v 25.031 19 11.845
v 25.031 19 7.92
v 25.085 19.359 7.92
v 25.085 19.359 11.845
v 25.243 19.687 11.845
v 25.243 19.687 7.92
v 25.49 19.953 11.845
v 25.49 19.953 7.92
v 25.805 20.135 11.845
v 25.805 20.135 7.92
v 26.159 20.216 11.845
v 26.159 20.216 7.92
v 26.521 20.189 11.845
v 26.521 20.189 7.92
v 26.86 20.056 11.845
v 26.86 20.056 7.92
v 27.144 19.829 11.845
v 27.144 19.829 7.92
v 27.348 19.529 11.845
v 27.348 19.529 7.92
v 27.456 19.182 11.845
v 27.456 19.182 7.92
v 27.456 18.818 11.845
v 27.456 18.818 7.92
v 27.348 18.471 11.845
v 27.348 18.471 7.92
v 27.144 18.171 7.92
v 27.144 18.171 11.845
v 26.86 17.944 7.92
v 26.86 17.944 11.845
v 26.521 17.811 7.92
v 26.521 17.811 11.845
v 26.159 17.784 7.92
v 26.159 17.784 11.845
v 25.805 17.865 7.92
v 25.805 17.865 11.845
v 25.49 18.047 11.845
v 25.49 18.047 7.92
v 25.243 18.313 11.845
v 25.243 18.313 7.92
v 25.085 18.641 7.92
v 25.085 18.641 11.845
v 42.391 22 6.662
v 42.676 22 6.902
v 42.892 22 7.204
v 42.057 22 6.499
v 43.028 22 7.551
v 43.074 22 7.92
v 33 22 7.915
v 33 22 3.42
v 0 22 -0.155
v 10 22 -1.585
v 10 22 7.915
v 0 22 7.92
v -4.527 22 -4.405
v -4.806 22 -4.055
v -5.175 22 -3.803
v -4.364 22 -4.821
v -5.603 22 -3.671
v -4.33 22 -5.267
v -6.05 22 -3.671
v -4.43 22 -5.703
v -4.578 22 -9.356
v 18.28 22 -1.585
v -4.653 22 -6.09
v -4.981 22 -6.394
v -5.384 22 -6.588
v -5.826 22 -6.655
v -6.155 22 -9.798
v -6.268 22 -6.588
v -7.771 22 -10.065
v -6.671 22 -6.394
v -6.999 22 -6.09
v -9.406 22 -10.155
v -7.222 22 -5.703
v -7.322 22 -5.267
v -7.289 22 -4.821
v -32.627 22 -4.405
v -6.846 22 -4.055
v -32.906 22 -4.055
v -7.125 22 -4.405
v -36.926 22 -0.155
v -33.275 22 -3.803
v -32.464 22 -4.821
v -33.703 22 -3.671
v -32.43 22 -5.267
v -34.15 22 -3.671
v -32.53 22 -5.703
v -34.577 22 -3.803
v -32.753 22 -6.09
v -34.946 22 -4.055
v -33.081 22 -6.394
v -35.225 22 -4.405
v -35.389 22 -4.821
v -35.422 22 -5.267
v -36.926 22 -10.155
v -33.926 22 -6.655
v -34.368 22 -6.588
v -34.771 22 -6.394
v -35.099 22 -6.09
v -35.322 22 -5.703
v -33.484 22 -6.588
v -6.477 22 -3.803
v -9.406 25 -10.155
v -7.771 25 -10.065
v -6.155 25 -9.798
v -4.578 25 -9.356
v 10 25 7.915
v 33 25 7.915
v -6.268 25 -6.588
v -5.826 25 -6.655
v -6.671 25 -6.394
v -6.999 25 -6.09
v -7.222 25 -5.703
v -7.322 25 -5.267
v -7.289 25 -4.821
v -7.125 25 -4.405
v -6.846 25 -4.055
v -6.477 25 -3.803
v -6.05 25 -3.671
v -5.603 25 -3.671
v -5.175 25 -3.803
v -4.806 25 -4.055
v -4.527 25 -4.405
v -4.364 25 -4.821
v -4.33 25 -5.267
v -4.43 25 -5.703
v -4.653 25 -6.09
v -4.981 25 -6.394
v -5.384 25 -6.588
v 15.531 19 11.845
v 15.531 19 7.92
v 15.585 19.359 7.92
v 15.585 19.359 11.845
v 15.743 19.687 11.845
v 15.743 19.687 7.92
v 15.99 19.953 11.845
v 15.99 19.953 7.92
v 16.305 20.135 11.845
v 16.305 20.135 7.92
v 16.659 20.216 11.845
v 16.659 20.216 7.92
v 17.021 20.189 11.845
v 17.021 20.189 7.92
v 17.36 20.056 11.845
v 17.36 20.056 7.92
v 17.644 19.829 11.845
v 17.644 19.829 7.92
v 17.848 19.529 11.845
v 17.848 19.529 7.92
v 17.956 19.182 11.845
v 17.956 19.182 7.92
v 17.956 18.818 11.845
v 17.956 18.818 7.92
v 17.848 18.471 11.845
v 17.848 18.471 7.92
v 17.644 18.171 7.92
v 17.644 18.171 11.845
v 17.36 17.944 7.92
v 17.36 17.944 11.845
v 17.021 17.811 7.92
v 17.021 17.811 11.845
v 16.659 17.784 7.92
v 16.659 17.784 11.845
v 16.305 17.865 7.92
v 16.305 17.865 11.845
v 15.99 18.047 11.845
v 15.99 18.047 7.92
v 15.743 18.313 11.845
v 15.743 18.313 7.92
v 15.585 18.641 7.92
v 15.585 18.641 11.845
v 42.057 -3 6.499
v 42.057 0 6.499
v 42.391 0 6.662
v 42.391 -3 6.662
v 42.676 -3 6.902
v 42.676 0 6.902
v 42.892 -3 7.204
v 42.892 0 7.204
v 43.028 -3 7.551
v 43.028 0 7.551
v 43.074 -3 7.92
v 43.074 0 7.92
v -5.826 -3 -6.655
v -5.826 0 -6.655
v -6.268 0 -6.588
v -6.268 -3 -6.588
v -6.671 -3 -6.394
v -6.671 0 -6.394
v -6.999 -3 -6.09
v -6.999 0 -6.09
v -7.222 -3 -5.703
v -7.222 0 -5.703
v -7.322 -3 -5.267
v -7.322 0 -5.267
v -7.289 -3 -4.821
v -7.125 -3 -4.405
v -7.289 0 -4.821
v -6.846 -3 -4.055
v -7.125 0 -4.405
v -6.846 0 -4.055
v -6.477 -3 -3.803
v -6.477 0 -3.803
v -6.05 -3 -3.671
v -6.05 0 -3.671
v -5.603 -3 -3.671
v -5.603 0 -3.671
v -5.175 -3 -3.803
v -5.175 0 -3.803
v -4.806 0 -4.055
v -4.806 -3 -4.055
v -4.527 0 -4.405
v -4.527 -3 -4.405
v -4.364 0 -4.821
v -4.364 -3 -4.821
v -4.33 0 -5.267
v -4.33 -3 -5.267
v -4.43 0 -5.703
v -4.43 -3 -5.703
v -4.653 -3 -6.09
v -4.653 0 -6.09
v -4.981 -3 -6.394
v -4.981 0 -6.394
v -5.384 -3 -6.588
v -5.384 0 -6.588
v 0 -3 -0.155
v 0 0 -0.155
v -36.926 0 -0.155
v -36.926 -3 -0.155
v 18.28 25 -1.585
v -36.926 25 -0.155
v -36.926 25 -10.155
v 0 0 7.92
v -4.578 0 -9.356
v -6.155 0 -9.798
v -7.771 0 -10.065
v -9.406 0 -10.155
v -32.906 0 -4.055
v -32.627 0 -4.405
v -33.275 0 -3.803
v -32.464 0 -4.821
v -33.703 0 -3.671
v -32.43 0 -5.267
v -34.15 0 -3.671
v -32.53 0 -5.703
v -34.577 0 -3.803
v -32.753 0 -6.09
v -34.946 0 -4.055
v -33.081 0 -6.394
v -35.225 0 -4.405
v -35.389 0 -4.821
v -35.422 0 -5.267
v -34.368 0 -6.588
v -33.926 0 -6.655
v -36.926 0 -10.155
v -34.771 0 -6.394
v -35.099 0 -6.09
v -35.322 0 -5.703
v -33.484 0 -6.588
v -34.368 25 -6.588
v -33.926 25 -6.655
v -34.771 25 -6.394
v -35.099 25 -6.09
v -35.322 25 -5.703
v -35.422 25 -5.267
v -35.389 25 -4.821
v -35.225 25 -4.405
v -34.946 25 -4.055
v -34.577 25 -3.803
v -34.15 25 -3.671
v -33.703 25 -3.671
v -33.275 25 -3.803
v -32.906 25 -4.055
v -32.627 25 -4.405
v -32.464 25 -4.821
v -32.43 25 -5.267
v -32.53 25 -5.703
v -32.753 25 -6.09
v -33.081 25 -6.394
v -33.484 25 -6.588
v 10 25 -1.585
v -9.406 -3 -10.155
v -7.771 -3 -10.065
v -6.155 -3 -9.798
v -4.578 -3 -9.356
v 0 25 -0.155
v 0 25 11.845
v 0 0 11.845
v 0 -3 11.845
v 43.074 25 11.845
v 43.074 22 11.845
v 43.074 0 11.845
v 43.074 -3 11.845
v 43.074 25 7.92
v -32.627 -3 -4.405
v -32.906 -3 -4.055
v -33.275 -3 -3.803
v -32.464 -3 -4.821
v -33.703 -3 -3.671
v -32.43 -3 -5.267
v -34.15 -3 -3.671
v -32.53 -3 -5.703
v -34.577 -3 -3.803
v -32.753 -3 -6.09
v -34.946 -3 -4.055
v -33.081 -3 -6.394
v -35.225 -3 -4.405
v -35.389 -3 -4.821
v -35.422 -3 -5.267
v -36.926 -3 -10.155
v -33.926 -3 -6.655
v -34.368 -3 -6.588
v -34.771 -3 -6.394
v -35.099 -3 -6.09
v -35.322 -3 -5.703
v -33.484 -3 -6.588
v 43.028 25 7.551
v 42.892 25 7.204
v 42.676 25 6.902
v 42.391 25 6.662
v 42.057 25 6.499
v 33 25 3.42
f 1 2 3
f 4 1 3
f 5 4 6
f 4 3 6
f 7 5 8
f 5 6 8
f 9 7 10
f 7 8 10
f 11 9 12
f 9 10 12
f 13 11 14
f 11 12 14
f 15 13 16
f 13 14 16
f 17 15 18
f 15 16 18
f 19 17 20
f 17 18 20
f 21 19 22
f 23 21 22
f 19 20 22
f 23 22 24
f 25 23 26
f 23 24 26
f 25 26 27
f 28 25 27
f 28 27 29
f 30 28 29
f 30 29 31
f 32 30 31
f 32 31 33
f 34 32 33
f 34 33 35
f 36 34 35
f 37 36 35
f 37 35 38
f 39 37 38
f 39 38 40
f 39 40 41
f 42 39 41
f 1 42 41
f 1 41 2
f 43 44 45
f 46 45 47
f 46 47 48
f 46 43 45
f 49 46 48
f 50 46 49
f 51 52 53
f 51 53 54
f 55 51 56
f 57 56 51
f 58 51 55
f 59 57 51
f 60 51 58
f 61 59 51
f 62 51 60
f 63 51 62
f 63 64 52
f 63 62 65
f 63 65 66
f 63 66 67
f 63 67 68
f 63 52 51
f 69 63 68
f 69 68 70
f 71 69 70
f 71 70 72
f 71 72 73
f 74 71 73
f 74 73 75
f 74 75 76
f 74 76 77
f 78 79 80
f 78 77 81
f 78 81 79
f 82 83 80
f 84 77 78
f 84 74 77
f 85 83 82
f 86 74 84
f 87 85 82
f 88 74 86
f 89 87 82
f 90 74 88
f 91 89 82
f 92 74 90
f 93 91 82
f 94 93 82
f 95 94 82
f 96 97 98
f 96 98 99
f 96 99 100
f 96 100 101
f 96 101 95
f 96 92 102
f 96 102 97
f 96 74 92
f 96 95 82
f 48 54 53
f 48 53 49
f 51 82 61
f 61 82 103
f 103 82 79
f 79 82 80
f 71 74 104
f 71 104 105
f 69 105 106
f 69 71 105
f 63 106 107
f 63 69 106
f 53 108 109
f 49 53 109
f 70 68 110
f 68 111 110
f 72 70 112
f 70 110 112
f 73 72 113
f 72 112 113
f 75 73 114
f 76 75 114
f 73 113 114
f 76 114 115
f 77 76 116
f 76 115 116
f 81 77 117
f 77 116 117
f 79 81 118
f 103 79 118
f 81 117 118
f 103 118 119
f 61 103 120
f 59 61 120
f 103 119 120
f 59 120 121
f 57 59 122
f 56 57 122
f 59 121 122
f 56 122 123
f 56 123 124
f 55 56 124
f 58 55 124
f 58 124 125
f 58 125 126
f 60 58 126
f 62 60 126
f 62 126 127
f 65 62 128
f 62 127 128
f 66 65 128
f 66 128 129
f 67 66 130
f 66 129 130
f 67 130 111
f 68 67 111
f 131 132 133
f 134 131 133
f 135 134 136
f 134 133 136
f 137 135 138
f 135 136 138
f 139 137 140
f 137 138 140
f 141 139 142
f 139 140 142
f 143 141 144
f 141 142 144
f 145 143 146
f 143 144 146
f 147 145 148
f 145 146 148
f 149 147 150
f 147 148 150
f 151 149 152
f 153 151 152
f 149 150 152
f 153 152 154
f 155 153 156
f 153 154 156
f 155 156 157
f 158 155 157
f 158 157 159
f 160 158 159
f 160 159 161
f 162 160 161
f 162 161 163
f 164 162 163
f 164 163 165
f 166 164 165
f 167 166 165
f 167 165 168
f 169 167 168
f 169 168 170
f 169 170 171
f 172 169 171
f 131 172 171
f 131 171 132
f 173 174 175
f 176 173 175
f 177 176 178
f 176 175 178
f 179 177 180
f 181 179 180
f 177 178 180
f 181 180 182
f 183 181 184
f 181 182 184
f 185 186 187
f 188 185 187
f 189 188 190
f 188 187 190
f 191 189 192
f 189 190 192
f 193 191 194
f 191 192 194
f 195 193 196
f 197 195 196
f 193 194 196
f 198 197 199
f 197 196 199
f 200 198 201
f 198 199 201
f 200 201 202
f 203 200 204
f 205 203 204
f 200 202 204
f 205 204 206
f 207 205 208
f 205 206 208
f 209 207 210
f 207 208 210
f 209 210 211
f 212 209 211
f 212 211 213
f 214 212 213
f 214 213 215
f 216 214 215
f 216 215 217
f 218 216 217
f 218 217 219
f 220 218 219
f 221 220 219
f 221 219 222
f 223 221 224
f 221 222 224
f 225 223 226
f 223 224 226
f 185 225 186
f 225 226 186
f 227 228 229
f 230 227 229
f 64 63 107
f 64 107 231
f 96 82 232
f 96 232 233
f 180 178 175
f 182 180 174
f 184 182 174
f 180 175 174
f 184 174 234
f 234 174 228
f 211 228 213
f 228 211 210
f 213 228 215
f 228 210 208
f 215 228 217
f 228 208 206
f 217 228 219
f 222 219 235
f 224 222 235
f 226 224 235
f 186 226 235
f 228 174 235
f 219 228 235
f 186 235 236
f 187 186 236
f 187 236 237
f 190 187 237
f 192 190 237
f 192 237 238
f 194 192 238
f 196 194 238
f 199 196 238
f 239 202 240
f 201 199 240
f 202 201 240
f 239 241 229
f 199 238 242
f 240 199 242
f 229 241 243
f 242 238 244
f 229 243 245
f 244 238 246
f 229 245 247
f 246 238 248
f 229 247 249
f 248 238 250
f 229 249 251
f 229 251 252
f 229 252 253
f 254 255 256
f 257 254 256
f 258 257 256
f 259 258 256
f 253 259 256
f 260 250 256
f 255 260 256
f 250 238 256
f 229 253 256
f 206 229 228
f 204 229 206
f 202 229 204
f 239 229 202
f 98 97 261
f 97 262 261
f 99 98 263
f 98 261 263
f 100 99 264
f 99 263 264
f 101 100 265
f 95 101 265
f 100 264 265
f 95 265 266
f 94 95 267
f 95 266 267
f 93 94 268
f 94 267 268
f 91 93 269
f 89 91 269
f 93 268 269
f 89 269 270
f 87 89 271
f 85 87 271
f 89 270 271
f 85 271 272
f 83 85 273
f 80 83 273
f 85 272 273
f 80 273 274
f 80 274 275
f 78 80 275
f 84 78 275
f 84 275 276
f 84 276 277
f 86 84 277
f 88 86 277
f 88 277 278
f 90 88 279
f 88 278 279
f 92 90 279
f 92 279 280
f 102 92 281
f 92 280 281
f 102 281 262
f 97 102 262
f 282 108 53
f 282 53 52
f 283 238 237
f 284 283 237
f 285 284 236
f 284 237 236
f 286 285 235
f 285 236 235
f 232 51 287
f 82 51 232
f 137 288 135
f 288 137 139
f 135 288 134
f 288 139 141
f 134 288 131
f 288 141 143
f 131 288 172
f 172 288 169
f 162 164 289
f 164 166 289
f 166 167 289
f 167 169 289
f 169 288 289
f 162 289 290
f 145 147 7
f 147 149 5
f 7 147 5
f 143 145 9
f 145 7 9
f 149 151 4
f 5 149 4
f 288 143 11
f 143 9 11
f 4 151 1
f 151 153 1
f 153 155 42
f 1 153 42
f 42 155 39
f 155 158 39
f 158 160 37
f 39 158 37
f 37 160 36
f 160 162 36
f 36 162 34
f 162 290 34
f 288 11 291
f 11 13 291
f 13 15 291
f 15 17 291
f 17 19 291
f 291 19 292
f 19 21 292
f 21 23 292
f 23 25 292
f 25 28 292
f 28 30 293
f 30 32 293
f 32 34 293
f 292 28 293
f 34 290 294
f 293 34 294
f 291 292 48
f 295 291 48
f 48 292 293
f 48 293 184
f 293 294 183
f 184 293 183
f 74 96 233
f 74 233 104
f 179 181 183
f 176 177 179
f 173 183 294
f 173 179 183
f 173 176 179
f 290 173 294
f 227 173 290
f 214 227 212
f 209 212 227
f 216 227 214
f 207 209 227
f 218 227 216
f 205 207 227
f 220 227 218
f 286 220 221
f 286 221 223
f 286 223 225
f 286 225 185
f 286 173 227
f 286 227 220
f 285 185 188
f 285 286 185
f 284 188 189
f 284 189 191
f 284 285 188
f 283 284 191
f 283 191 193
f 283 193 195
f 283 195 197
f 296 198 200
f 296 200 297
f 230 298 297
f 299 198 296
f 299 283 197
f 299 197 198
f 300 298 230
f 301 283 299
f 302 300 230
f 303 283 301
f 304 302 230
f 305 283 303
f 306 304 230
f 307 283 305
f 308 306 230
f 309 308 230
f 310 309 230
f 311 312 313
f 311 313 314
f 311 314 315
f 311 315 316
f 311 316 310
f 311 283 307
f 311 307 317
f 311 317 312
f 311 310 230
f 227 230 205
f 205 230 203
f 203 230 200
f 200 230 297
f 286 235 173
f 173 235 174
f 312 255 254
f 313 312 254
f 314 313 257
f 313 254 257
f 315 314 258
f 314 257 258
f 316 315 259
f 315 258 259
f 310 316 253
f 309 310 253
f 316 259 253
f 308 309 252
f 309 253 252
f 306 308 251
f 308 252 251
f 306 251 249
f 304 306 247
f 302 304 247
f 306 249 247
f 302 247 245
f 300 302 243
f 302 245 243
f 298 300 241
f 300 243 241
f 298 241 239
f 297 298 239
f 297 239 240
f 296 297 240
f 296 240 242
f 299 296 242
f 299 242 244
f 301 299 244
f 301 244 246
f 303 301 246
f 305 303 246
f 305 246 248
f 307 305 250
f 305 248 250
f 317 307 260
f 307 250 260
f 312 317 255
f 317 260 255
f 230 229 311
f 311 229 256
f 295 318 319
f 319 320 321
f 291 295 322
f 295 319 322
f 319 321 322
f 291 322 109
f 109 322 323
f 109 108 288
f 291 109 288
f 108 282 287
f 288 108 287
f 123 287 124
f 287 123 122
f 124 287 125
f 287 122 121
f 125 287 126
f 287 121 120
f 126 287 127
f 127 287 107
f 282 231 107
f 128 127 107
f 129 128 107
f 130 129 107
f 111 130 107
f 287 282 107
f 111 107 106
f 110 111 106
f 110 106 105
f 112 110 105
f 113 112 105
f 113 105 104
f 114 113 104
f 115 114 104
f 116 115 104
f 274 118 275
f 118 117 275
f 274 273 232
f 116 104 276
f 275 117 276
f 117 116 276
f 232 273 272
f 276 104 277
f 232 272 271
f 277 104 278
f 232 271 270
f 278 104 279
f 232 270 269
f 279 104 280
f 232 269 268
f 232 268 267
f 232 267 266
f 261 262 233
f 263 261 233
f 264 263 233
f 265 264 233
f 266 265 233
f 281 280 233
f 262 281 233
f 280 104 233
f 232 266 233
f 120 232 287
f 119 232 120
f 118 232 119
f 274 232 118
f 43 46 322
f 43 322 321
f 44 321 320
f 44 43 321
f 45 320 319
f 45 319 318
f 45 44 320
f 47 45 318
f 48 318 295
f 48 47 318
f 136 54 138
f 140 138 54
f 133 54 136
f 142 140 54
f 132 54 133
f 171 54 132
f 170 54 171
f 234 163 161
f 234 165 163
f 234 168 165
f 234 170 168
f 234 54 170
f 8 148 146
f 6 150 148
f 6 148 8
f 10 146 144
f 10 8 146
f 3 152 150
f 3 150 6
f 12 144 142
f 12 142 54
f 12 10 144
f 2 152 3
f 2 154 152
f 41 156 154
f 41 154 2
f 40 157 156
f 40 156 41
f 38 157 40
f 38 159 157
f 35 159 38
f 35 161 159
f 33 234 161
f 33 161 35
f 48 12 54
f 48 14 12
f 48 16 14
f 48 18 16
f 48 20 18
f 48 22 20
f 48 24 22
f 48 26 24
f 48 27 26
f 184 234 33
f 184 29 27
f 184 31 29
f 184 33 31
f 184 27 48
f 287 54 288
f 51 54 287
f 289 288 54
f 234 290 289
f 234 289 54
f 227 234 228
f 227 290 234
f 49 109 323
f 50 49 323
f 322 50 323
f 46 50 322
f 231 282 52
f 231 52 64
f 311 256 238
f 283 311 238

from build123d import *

# Parameters (mm, degrees)
BOSS_EXTRUDE1_DEPTH                      = 3
BOSS_EXTRUDE2_START                      = 22
BOSS_EXTRUDE2_DEPTH                      = 3
SKETCH3_W                                = 1.5
SKETCH3_H                                = 28
F_3_0MM_CLEARANCE_DOWEL_HOLE1_AT_2_COUNT = 2
F_3_0MM_CLEARANCE_DOWEL_HOLE1_AT_2_PITCH = 28.1
SKETCH5_W                                = 43.073811931
SKETCH5_H                                = 3.925670489
BOSS_EXTRUDE3_DEPTH                      = 22
SKETCH6_W                                = 23
SKETCH6_H                                = 9.5
CUT_EXTRUDE1_DEPTH                       = 10
F_2_CLEARANCE_HOLE1_D                    = 2.4384


with BuildPart() as part:
    # Sketch1 → Boss-Extrude1 (new body)
    with BuildSketch(Plane(origin=(0, 0, 0), x_dir=(1, 0, 0), z_dir=(0, 1, 0))):
        with BuildLine():
            Line((-4.577926811, 9.356292891), (42.056666031, -6.499468675))
            ThreePointArc((42.056666031, -6.499468675), (42.793295664, -7.04620955), (43.073811931, -7.919627792))
            Line((43.073811931, -7.919627792), (43.073811931, -11.845298281))
            Line((43.073811931, -11.845298281), (0, -11.845298281))
            Line((0, -11.845298281), (0, 0.154701719))
            Line((0, 0.154701719), (-36.926188069, 0.154701719))
            Line((-36.926188069, 0.154701719), (-36.926188069, 10.154701719))
            Line((-36.926188069, 10.154701719), (-9.406467809, 10.154701719))
            ThreePointArc((-9.406467809, 10.154701719), (-6.959415254, 9.953753506), (-4.577926811, 9.356292891))
        make_face()
    extrude(amount=-BOSS_EXTRUDE1_DEPTH)


with BuildPart() as body_2:
    # Sketch1<2> → Boss-Extrude2 (new body)
    with BuildSketch(Plane(origin=(0, 0, 0), x_dir=(1, 0, 0), z_dir=(0, 1, 0)).offset(BOSS_EXTRUDE2_START)):
        with BuildLine():
            Line((-4.577926811, 9.356292891), (42.056666031, -6.499468675))
            ThreePointArc((42.056666031, -6.499468675), (42.793295664, -7.04620955), (43.073811931, -7.919627792))
            Line((43.073811931, -7.919627792), (43.073811931, -11.845298281))
            Line((43.073811931, -11.845298281), (0, -11.845298281))
            Line((0, -11.845298281), (0, 0.154701719))
            Line((0, 0.154701719), (-36.926188069, 0.154701719))
            Line((-36.926188069, 0.154701719), (-36.926188069, 10.154701719))
            Line((-36.926188069, 10.154701719), (-9.406467809, 10.154701719))
            ThreePointArc((-9.406467809, 10.154701719), (-6.959415254, 9.953753506), (-4.577926811, 9.356292891))
        make_face()
    extrude(amount=BOSS_EXTRUDE2_DEPTH)


with BuildPart() as f_3_0mm_clearance_dowel_hole1_tool:
    # Sketch3 → Ø3.0mm Clearance Dowel Hole1 (revolve)
    with BuildSketch(Plane(origin=(-33.926188069, -3, -5.154701719), x_dir=(0, 0, -1), z_dir=(1, 0, 0))):
        with Locations((0.75, 14)):
            Rectangle(SKETCH3_W, SKETCH3_H)
    f_3_0mm_clearance_dowel_hole1 = revolve(axis=Axis((-33.926188069, -9.35, -5.154701719), (0, 1, 0)))


with BuildPart() as part_1:
    add(part.part)

    # Ø3.0mm Clearance Dowel Hole1: cut by f_3_0mm_clearance_dowel_hole1_tool
    add(f_3_0mm_clearance_dowel_hole1_tool.part, mode=Mode.SUBTRACT)


with BuildPart() as body_2_1:
    add(body_2.part)

    # Ø3.0mm Clearance Dowel Hole1: cut by f_3_0mm_clearance_dowel_hole1_tool
    add(f_3_0mm_clearance_dowel_hole1_tool.part, mode=Mode.SUBTRACT)


with BuildPart() as f_3_0mm_clearance_dowel_hole1_at_2_tool:
    # Ø3.0mm Clearance Dowel Hole1 at 2: Ø3.0mm Clearance Dowel Hole1 ×2
    with Locations(*[(i * F_3_0MM_CLEARANCE_DOWEL_HOLE1_AT_2_PITCH, 0, 0) for i in range(1, F_3_0MM_CLEARANCE_DOWEL_HOLE1_AT_2_COUNT)]):
        add(f_3_0mm_clearance_dowel_hole1)


with BuildPart() as part_2:
    add(part_1.part)

    # Ø3.0mm Clearance Dowel Hole1 at 2: cut by f_3_0mm_clearance_dowel_hole1_at_2_tool
    add(f_3_0mm_clearance_dowel_hole1_at_2_tool.part, mode=Mode.SUBTRACT)



with BuildPart() as body_2_2:
    add(body_2_1.part)

    # Ø3.0mm Clearance Dowel Hole1 at 2: cut by f_3_0mm_clearance_dowel_hole1_at_2_tool
    add(f_3_0mm_clearance_dowel_hole1_at_2_tool.part, mode=Mode.SUBTRACT)


with BuildPart() as part_3:
    add(part_2.part)

    add(body_2_2.part)  # Boss-Extrude3 merges body 2
    # Sketch5 → Boss-Extrude3 (add)
    with BuildSketch(Plane(origin=(0, 0, 0), x_dir=(1, 0, 0), z_dir=(0, 1, 0))):
        with Locations((21.536905966, -9.882463037)):
            Rectangle(SKETCH5_W, SKETCH5_H)
    extrude(amount=BOSS_EXTRUDE3_DEPTH)

    # Sketch6 → Cut-Extrude1 (cut)
    with BuildSketch(Plane(origin=(0, 25, 0), x_dir=(1, 0, 0), z_dir=(0, 1, 0))):
        with Locations((21.5, -3.165298281)):
            Rectangle(SKETCH6_W, SKETCH6_H)
    extrude(amount=-CUT_EXTRUDE1_DEPTH, mode=Mode.SUBTRACT)

    # #2 Clearance Hole1 (through all)
    with Locations(Plane.XY.offset(11.845298281)):
        with Locations((16.75, 19), (26.25, 19)):
            Hole(F_2_CLEARANCE_HOLE1_D / 2)


solid = part_3.part
